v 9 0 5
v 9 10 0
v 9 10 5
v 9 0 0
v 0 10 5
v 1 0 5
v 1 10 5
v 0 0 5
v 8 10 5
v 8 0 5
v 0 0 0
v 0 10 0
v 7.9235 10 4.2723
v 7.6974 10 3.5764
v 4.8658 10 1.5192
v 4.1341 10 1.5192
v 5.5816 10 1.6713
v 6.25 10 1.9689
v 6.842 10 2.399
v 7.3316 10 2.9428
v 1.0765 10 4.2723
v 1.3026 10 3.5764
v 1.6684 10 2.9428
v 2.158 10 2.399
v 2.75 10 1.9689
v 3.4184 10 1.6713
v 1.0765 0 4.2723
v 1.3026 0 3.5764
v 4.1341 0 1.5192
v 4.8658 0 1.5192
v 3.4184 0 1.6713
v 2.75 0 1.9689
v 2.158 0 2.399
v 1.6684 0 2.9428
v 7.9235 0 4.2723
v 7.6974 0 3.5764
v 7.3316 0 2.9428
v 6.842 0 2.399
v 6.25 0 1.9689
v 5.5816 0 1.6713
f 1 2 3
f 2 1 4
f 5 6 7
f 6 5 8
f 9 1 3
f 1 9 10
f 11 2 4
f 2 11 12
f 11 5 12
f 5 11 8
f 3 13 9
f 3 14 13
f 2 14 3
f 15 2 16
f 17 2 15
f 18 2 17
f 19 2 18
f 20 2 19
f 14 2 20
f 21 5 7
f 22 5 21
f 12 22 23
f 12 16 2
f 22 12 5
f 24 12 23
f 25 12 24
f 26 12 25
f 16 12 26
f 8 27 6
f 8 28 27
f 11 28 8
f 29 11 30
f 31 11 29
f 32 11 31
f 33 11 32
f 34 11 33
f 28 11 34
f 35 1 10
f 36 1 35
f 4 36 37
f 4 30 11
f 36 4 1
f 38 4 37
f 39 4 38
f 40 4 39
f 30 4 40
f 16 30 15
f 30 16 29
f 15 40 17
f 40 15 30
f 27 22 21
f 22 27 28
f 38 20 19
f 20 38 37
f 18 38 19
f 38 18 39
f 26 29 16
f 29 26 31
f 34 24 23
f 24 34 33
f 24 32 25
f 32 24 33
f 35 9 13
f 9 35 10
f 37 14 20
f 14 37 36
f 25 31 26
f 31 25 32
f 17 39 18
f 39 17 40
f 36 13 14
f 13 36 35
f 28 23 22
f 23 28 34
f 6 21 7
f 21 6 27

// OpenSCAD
difference() {
	$length=10;
	$width=9;
	$height=$length/2;
	cube([$width, $length, $height]);
	translate([$width/2, $length+1, $height])
		rotate([90, 0, 0])
			cylinder(h=$length+2, d=$width-2, $fn=30);
}
